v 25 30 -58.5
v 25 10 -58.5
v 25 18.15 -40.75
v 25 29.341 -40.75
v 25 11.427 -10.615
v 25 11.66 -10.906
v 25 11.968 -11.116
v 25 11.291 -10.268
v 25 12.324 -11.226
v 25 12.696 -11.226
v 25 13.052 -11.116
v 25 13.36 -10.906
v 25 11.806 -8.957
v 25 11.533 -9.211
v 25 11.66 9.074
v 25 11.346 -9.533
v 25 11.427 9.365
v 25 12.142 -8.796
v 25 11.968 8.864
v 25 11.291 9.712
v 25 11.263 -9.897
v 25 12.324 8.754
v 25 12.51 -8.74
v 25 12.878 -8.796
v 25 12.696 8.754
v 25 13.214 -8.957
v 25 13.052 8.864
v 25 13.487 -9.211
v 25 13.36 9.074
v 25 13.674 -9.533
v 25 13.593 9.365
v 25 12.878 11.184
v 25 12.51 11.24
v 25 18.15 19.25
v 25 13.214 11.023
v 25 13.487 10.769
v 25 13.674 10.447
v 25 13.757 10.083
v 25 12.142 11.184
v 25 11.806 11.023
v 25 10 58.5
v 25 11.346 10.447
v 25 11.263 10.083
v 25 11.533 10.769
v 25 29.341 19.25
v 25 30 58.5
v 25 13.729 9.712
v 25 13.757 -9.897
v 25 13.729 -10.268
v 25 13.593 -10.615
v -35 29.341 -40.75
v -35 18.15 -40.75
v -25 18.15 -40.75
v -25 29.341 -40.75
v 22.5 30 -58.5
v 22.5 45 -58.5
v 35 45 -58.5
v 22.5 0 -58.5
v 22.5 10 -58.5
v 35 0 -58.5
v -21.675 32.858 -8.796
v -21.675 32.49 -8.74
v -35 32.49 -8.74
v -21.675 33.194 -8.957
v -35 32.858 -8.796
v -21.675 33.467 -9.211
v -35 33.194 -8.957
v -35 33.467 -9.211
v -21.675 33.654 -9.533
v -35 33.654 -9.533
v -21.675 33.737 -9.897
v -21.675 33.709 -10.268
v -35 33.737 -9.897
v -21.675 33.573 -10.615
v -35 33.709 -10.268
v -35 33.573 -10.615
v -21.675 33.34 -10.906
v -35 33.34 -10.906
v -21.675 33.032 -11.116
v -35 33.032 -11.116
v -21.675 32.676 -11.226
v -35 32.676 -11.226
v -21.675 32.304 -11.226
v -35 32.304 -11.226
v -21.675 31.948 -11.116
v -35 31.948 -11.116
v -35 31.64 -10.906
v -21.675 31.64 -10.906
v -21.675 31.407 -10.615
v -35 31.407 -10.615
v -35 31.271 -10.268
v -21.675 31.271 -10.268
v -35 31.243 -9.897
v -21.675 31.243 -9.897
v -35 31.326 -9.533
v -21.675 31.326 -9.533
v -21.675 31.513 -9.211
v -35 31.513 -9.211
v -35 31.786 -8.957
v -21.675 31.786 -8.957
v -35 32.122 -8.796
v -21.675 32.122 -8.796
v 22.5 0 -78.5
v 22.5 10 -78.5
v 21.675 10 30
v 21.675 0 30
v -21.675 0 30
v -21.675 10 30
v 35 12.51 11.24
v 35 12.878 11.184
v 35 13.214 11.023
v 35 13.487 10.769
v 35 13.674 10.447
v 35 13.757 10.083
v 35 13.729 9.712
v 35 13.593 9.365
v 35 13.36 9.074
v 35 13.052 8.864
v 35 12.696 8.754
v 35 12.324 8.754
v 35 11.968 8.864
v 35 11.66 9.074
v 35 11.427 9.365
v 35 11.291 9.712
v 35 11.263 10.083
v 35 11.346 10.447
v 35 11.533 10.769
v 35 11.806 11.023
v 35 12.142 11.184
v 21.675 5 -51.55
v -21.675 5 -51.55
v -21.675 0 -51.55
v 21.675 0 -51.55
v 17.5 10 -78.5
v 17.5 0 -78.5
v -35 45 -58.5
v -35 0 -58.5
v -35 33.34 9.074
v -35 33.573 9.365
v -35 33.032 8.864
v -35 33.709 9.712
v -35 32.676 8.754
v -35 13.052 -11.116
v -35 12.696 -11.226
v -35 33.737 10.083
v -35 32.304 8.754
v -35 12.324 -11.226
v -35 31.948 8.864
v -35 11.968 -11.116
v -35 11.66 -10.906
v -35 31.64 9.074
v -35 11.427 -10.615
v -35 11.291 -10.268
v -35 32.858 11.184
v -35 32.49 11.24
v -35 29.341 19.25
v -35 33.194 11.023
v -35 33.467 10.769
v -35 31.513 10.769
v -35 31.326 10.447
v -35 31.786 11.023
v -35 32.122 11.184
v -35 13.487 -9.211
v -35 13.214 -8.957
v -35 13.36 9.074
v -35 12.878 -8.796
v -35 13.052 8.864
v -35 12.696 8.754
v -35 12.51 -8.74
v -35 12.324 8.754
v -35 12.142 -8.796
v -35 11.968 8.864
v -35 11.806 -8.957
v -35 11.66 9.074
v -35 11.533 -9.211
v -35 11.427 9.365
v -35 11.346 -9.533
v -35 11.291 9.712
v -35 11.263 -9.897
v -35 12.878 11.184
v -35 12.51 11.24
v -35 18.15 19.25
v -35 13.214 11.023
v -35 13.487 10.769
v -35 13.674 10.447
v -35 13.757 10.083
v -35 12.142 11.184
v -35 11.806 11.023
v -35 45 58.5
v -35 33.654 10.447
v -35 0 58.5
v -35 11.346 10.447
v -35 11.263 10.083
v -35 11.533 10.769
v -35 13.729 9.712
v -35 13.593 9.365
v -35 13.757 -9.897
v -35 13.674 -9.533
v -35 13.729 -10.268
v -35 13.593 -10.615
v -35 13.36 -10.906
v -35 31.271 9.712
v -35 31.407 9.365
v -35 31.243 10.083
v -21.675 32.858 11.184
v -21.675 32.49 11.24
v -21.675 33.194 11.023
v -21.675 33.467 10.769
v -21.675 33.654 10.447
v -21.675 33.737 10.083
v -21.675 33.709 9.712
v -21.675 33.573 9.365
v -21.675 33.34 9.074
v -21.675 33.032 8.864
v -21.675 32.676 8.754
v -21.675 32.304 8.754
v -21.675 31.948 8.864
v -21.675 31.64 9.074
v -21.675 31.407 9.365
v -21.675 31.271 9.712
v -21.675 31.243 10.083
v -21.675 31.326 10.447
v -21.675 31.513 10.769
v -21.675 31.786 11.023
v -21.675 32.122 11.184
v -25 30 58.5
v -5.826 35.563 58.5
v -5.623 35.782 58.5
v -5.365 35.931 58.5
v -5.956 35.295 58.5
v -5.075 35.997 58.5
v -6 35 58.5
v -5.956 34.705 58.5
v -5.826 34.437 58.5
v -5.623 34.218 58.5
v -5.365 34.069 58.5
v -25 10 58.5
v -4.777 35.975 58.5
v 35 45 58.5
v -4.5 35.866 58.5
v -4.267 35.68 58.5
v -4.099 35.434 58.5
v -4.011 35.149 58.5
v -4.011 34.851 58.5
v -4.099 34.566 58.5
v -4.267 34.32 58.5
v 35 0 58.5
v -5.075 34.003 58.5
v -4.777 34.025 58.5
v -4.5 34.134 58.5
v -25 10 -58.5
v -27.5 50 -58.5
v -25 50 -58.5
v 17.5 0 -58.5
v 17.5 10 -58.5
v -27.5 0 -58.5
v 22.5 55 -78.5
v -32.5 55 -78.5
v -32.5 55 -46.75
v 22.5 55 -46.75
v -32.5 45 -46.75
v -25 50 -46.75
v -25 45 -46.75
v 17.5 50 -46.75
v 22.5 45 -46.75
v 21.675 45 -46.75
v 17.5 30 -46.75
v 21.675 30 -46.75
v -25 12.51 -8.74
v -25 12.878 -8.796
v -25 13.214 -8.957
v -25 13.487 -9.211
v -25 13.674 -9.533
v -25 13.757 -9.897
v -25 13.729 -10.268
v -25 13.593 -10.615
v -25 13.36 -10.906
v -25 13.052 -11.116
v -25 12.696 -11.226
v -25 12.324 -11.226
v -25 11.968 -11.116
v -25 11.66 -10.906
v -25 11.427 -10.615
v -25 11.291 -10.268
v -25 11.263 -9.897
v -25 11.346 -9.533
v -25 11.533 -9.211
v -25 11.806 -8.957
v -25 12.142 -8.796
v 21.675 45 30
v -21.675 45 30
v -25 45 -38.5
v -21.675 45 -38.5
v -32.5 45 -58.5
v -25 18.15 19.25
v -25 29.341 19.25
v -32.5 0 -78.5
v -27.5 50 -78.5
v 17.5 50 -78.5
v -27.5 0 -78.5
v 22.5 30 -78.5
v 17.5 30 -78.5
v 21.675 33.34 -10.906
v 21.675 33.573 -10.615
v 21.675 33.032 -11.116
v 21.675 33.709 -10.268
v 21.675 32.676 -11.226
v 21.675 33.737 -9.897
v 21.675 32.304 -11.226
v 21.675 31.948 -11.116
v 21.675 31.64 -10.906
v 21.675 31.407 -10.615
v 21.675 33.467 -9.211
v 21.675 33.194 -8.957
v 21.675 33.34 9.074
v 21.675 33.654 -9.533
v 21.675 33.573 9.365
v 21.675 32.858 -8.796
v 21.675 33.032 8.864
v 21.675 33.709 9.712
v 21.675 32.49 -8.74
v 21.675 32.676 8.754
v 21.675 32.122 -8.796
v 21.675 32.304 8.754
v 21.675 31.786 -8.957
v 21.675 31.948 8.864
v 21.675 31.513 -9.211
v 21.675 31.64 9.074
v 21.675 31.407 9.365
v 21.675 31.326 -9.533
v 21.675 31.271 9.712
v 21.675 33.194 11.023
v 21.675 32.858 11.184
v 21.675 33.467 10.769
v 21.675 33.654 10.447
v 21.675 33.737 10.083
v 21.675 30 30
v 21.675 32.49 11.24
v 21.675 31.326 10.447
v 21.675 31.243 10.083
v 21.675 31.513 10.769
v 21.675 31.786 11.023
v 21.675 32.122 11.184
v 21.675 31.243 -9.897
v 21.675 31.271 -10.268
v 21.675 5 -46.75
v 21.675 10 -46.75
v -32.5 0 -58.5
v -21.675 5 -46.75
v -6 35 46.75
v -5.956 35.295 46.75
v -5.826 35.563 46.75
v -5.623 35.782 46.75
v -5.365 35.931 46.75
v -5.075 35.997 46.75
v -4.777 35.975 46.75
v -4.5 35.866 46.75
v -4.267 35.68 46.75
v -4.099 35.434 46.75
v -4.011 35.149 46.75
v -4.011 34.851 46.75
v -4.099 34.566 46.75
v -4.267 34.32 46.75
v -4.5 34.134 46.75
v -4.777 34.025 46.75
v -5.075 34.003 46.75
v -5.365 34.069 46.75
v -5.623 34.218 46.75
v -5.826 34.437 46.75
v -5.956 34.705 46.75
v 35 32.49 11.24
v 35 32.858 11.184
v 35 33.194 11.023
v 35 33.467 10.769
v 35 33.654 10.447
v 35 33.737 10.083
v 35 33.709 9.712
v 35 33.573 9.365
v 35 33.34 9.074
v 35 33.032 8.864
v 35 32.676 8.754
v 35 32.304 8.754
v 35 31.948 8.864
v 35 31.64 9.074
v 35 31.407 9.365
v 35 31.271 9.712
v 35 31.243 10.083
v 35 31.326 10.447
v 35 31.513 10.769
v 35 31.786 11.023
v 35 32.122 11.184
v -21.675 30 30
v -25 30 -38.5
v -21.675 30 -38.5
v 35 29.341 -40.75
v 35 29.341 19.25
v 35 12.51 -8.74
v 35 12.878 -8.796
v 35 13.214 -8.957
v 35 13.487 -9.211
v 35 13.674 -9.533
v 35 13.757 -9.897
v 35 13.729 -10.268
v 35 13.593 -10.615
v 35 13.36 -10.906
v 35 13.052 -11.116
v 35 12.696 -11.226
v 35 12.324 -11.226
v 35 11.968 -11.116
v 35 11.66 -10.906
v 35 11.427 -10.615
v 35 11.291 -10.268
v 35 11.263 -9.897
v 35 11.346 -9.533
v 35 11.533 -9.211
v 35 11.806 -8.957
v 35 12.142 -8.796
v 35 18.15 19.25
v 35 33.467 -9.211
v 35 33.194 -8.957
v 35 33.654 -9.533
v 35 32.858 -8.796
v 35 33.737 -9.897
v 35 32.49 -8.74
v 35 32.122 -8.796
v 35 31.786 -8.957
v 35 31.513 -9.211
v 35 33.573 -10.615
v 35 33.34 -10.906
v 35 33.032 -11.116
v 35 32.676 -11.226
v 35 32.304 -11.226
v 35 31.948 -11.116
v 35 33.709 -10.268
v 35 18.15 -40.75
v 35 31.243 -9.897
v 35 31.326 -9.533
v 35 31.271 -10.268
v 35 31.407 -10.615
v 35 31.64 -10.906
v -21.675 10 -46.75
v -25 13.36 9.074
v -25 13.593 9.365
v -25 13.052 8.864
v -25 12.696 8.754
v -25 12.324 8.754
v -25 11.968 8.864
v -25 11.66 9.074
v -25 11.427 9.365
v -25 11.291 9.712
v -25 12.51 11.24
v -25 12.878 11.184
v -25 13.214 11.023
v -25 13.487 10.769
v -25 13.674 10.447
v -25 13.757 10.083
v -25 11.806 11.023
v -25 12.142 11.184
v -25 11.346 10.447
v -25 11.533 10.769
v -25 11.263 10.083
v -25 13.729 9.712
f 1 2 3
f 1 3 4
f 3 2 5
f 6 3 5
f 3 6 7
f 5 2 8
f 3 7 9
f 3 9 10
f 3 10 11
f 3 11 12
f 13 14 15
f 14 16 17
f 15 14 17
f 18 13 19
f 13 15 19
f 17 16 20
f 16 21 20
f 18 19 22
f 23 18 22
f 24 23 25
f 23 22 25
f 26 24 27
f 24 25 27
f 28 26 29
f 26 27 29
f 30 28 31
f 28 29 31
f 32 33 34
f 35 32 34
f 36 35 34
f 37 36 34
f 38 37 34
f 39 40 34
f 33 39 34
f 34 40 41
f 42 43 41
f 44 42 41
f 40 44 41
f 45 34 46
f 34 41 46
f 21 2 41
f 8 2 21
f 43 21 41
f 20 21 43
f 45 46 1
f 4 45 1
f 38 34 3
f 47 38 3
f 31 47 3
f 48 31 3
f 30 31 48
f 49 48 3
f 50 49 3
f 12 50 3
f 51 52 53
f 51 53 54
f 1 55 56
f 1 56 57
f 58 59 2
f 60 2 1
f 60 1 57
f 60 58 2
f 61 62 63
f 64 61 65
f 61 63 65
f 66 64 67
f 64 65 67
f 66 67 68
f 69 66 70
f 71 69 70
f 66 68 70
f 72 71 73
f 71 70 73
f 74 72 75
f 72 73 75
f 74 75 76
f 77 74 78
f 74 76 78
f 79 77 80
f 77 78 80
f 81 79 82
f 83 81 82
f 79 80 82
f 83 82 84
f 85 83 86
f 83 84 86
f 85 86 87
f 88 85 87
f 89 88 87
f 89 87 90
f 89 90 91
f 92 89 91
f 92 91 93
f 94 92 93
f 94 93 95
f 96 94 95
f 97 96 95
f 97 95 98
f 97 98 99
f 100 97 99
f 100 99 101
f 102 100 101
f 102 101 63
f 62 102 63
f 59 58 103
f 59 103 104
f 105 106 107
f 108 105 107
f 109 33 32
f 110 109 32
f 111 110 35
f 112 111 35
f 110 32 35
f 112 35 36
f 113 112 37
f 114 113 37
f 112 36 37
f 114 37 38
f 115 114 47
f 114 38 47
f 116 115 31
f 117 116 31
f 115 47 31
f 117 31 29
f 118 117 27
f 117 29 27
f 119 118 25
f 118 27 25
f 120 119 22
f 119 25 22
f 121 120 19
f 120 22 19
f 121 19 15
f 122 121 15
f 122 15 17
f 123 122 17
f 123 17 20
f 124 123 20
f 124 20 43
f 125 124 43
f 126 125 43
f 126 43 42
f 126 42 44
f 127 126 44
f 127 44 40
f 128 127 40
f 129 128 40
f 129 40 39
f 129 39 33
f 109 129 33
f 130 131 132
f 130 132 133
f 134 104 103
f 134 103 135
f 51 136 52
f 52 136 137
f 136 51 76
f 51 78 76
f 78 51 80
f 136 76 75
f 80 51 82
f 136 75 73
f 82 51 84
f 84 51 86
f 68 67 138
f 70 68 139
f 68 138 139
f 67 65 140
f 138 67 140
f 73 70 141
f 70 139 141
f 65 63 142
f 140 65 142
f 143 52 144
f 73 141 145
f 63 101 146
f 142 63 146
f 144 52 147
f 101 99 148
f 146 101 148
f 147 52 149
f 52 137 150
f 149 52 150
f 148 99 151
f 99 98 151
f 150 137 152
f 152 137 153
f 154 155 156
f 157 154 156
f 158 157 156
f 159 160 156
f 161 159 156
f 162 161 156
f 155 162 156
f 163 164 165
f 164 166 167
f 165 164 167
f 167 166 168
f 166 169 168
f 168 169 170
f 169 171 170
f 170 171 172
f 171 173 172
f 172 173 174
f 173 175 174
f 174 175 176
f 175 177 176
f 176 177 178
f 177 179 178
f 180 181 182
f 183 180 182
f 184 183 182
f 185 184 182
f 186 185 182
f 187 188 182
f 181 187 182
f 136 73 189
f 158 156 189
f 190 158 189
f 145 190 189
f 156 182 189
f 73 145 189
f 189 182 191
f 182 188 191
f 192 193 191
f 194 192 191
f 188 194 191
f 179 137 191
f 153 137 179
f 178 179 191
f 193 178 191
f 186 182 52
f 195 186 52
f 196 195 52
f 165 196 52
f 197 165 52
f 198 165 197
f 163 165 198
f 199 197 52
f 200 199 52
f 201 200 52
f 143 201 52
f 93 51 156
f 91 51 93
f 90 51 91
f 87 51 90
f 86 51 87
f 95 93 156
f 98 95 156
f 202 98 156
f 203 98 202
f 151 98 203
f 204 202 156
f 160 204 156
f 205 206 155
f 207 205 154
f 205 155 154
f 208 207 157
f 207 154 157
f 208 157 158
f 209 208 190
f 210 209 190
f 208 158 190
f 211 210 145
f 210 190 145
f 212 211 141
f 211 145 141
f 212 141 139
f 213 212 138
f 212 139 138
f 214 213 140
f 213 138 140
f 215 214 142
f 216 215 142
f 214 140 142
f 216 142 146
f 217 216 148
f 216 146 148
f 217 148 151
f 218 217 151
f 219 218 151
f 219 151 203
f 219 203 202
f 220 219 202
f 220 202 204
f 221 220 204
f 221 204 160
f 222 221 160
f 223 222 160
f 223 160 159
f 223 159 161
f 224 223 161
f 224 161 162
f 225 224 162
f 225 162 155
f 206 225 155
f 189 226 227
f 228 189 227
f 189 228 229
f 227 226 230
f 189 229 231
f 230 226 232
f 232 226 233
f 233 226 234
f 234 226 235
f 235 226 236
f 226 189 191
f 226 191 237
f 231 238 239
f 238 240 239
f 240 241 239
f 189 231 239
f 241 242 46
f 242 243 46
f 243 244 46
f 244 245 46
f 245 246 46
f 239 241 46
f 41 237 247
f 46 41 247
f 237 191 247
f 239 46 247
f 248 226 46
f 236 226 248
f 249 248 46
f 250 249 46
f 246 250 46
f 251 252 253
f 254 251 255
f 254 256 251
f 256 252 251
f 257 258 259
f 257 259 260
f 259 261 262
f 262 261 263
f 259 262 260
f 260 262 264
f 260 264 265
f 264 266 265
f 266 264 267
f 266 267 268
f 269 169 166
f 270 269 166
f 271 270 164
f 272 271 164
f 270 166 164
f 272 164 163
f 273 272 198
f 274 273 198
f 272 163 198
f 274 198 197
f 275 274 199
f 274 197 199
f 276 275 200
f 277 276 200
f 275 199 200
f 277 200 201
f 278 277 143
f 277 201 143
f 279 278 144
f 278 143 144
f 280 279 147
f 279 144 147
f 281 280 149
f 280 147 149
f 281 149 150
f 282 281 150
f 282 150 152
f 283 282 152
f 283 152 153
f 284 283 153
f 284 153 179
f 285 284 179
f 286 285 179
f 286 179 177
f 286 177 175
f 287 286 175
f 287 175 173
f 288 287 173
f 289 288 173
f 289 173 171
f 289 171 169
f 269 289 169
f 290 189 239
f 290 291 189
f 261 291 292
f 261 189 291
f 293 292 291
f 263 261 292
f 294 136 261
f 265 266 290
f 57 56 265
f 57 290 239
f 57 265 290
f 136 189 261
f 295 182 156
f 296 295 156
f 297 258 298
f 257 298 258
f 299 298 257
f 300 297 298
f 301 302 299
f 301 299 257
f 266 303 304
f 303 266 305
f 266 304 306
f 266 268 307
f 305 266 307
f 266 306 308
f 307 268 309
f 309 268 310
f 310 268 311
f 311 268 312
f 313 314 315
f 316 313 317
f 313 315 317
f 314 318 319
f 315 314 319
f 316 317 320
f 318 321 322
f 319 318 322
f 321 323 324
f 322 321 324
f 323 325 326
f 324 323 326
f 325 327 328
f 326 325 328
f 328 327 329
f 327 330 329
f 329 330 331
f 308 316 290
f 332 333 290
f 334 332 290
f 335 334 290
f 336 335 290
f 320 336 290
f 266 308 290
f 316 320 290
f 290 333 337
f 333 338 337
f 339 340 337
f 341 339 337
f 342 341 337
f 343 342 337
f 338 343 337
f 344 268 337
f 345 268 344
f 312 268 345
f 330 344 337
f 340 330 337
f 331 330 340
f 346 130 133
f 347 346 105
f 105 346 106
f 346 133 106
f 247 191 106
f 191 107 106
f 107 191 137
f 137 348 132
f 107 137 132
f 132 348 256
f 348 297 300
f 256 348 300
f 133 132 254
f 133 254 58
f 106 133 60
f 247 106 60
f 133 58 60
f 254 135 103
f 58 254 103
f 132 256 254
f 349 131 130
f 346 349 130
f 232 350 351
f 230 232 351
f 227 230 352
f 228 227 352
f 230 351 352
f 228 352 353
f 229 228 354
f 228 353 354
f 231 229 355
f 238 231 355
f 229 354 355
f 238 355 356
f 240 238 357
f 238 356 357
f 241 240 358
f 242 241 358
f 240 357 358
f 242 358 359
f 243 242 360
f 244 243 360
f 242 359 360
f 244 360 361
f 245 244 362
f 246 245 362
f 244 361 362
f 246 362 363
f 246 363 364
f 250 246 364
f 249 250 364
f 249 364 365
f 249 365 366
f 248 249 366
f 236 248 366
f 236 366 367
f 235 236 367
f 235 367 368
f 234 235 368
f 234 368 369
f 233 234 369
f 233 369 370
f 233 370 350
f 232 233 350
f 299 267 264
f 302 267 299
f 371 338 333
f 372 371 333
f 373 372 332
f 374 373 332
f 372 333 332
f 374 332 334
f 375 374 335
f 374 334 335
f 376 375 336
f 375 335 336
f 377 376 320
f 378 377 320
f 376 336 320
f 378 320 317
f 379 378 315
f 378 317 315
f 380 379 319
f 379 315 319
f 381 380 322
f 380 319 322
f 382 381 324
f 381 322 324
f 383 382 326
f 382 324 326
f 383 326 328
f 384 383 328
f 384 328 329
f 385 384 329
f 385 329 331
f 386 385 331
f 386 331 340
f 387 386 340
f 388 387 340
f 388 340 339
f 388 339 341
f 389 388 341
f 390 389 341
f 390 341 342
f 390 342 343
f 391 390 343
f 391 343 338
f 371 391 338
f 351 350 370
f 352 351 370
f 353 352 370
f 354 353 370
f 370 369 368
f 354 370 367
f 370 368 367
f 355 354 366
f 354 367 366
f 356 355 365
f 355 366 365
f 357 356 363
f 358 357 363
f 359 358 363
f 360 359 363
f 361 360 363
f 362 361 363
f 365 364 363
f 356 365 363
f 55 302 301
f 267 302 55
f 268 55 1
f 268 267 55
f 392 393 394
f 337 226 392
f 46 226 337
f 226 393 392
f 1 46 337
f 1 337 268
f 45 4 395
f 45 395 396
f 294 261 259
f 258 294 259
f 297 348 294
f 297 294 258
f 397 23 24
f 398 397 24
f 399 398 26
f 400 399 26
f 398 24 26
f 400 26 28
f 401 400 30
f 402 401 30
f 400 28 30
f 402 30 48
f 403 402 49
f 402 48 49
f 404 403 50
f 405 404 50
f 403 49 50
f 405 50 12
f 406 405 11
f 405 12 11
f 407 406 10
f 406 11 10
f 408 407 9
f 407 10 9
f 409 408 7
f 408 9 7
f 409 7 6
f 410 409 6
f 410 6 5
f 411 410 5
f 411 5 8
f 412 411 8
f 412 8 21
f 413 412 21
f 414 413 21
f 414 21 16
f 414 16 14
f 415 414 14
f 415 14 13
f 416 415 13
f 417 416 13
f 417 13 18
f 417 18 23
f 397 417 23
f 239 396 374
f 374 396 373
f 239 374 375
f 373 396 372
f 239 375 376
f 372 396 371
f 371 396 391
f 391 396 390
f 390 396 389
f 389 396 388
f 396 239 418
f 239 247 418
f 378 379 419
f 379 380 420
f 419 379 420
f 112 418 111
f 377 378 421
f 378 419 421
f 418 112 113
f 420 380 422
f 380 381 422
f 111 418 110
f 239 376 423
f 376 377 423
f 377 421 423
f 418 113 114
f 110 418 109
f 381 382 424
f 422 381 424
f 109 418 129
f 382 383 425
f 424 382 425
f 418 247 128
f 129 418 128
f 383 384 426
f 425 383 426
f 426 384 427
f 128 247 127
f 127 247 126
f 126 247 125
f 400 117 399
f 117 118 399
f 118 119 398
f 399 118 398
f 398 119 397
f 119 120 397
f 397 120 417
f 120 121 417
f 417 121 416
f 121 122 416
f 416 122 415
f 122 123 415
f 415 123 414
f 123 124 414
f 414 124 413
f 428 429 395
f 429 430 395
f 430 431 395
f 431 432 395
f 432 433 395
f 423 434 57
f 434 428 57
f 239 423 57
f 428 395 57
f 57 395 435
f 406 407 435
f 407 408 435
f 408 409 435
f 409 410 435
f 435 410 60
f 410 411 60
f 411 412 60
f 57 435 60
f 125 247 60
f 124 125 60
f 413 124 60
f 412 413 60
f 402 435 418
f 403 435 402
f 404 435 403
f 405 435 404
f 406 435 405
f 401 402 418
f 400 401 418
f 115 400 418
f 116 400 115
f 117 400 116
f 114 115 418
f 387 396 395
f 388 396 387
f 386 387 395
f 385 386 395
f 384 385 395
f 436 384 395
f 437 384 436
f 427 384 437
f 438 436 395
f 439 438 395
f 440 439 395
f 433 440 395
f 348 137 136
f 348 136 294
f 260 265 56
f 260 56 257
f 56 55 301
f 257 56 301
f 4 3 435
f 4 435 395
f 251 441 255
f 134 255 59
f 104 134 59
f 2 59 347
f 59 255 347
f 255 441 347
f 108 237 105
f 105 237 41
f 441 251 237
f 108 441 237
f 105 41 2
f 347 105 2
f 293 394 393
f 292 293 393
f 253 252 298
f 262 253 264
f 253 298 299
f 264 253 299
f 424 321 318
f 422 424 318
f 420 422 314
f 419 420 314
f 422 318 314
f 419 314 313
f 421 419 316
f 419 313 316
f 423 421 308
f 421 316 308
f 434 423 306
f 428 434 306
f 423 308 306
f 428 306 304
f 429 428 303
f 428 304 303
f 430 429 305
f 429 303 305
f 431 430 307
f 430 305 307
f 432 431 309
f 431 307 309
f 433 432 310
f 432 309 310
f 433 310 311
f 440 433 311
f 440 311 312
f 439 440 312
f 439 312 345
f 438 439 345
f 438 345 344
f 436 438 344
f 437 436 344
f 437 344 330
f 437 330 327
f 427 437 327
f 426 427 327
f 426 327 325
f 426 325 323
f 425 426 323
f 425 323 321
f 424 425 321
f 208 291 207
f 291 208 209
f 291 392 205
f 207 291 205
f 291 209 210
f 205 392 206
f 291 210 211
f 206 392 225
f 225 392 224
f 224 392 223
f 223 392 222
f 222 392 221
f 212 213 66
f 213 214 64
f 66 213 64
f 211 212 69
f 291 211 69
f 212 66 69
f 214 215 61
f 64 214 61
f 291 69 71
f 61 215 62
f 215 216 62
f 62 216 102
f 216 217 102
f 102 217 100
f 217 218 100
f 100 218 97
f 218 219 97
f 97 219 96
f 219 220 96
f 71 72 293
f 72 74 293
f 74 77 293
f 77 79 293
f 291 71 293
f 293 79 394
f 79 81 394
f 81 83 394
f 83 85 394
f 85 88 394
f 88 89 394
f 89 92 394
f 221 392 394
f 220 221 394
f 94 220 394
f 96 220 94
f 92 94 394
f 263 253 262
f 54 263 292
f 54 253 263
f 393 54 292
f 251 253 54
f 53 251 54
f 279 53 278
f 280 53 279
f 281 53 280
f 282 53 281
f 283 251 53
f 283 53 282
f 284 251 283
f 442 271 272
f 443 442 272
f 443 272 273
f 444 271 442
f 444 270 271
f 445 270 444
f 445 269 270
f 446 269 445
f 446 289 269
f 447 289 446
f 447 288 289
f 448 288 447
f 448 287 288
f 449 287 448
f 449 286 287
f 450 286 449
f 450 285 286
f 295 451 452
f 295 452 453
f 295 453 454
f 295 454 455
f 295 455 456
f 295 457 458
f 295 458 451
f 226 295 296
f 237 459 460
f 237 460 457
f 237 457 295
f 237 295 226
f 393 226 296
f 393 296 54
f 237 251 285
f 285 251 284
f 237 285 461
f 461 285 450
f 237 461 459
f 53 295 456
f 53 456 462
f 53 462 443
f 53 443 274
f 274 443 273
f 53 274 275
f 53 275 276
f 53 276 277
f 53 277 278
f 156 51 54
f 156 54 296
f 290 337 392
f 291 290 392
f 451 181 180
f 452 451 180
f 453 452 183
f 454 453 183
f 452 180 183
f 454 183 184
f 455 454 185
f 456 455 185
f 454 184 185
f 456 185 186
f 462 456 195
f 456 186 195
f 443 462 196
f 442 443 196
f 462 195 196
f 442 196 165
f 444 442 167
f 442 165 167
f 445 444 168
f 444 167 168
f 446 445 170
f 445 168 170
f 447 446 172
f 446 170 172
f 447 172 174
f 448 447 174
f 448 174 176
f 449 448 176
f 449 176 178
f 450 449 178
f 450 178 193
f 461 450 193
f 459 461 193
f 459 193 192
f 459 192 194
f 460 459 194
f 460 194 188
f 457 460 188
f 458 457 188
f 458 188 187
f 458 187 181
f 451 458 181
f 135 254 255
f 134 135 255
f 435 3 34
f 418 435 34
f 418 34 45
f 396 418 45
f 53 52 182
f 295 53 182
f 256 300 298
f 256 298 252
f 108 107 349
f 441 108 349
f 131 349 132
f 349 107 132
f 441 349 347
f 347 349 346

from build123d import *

# Parameters (mm, degrees)
CROQUIS1_W              = 70
CROQUIS1_H              = 117
SALIENTE_EXTRUIR1_DEPTH = 5
CROQUIS2_W              = 70
CROQUIS2_H              = 11.75
SALIENTE_EXTRUIR2_DEPTH = 40
CROQUIS5_R              = 1
CORTAR_EXTRUIR3_DEPTH   = 118
CROQUIS3_W              = 43.35
CROQUIS3_H              = 81.55
CORTAR_EXTRUIR1_DEPTH   = 10
SALIENTE_EXTRUIR4_DEPTH = 40
CROQUIS7_R              = 1.25
CROQUIS7_W              = 60
CROQUIS7_H              = 11.191024472
CORTAR_EXTRUIR5_DEPTH   = 71
CROQUIS9_W              = 50
CROQUIS9_H              = 20
CORTAR_EXTRUIR6_DEPTH   = 118
CROQUIS11_W             = 5
CROQUIS11_H             = 45
CROQUIS11_H_2           = 15
CROQUIS11_H_3           = 10
SALIENTE_EXTRUIR5_DEPTH = 20
CROQUIS12_W             = 42.5
CROQUIS12_H             = 15
CORTAR_EXTRUIR7_DEPTH   = 20
CROQUIS13_W             = 5
CROQUIS13_H             = 31.75
SALIENTE_EXTRUIR6_DEPTH = 5
CROQUIS14_W             = 55
CROQUIS14_H             = 31.75
SALIENTE_EXTRUIR7_DEPTH = 5


with BuildPart() as part:
    # Croquis1 → Saliente-Extruir1 (new body)
    with BuildSketch(Plane(origin=(0, 0, 0), x_dir=(1, 0, 0), z_dir=(0, 1, 0))):
        Rectangle(CROQUIS1_W, CROQUIS1_H)
    extrude(amount=SALIENTE_EXTRUIR1_DEPTH)

    # Croquis2 → Saliente-Extruir2 (add)
    with BuildSketch(Plane(origin=(0, 5, 0), x_dir=(1, 0, 0), z_dir=(0, 1, 0))):
        with Locations((0, 52.625)):
            Rectangle(CROQUIS2_W, CROQUIS2_H)
        with Locations((0, -52.625)):
            Rectangle(CROQUIS2_W, CROQUIS2_H)
    extrude(amount=SALIENTE_EXTRUIR2_DEPTH)

    # Croquis5 → Cortar-Extruir3 (cut, through all)
    with BuildSketch(Plane(origin=(0, 0, -58.5), x_dir=(-1, 0, 0), z_dir=(0, 0, -1))):
        with Locations((5, 35)):
            Circle(CROQUIS5_R)
    extrude(amount=-CORTAR_EXTRUIR3_DEPTH, mode=Mode.SUBTRACT)

    # Croquis3 → Cortar-Extruir1 (cut)
    with BuildSketch(Plane(origin=(0, 5, 0), x_dir=(1, 0, 0), z_dir=(0, 1, 0))):
        with Locations((0, 10.775)):
            Rectangle(CROQUIS3_W, CROQUIS3_H)
    extrude(amount=-CORTAR_EXTRUIR1_DEPTH, mode=Mode.SUBTRACT)

    # Croquis8 → Saliente-Extruir4 (add)
    with BuildSketch(Plane(origin=(0, 5, 0), x_dir=(1, 0, 0), z_dir=(0, 1, 0))):
        Polygon((35, -46.75), (35, 46.75), (21.675, 46.75), (21.675, -30), (-21.675, -30), (-21.675, 46.75), (-35, 46.75), (-35, -46.75), align=None)
    extrude(amount=SALIENTE_EXTRUIR4_DEPTH)

    # Croquis7 → Cortar-Extruir5 (cut, through all)
    with BuildSketch(Plane.ZY.offset(35)):
        with Locations((-9.99, 32.49)):
            Circle(CROQUIS7_R)
        with Locations((9.99, 32.49)):
            Circle(CROQUIS7_R)
        with Locations((9.99, 12.51)):
            Circle(CROQUIS7_R)
        with Locations((-9.99, 12.51)):
            Circle(CROQUIS7_R)
        with Locations((-10.75, 23.745325958)):
            Rectangle(CROQUIS7_W, CROQUIS7_H)
    extrude(amount=-CORTAR_EXTRUIR5_DEPTH, mode=Mode.SUBTRACT)

    # Croquis9 → Cortar-Extruir6 (cut, through all)
    with BuildSketch(Plane.XY.offset(58.5)):
        with Locations((0, 20)):
            Rectangle(CROQUIS9_W, CROQUIS9_H)
    extrude(amount=-CORTAR_EXTRUIR6_DEPTH, mode=Mode.SUBTRACT)

    # Croquis11 → Saliente-Extruir5 (add)
    with BuildSketch(Plane(origin=(0, 0, -58.5), x_dir=(-1, 0, 0), z_dir=(0, 0, -1))):
        with Locations((30, 22.5)):
            Rectangle(CROQUIS11_W, CROQUIS11_H)
        with Locations((-20, 37.5)):
            Rectangle(CROQUIS11_W, CROQUIS11_H_2)
        with Locations((-20, 5)):
            Rectangle(CROQUIS11_W, CROQUIS11_H_3)
    extrude(amount=SALIENTE_EXTRUIR5_DEPTH)

    # Croquis12 → Cortar-Extruir7 (cut)
    with BuildSketch(Plane(origin=(0, 0, -58.5), x_dir=(-1, 0, 0), z_dir=(0, 0, -1))):
        with Locations((3.75, 37.5)):
            Rectangle(CROQUIS12_W, CROQUIS12_H)
    extrude(amount=-CORTAR_EXTRUIR7_DEPTH, mode=Mode.SUBTRACT)

    # Croquis13 → Saliente-Extruir6 (add)
    with BuildSketch(Plane(origin=(0, 45, 0), x_dir=(1, 0, 0), z_dir=(0, 1, 0))):
        Polygon((-32.5, 78.5), (-27.5, 78.5), (-27.5, 58.5), (-25, 58.5), (-25, 46.75), (-32.5, 46.75), align=None)
        with Locations((20, 62.625)):
            Rectangle(CROQUIS13_W, CROQUIS13_H)
    extrude(amount=SALIENTE_EXTRUIR6_DEPTH)

    # Croquis14 → Saliente-Extruir7 (add)
    with BuildSketch(Plane(origin=(0, 50, 0), x_dir=(1, 0, 0), z_dir=(0, 1, 0))):
        with Locations((-5, 62.625)):
            Rectangle(CROQUIS14_W, CROQUIS14_H)
    extrude(amount=SALIENTE_EXTRUIR7_DEPTH)


solid = part.part
